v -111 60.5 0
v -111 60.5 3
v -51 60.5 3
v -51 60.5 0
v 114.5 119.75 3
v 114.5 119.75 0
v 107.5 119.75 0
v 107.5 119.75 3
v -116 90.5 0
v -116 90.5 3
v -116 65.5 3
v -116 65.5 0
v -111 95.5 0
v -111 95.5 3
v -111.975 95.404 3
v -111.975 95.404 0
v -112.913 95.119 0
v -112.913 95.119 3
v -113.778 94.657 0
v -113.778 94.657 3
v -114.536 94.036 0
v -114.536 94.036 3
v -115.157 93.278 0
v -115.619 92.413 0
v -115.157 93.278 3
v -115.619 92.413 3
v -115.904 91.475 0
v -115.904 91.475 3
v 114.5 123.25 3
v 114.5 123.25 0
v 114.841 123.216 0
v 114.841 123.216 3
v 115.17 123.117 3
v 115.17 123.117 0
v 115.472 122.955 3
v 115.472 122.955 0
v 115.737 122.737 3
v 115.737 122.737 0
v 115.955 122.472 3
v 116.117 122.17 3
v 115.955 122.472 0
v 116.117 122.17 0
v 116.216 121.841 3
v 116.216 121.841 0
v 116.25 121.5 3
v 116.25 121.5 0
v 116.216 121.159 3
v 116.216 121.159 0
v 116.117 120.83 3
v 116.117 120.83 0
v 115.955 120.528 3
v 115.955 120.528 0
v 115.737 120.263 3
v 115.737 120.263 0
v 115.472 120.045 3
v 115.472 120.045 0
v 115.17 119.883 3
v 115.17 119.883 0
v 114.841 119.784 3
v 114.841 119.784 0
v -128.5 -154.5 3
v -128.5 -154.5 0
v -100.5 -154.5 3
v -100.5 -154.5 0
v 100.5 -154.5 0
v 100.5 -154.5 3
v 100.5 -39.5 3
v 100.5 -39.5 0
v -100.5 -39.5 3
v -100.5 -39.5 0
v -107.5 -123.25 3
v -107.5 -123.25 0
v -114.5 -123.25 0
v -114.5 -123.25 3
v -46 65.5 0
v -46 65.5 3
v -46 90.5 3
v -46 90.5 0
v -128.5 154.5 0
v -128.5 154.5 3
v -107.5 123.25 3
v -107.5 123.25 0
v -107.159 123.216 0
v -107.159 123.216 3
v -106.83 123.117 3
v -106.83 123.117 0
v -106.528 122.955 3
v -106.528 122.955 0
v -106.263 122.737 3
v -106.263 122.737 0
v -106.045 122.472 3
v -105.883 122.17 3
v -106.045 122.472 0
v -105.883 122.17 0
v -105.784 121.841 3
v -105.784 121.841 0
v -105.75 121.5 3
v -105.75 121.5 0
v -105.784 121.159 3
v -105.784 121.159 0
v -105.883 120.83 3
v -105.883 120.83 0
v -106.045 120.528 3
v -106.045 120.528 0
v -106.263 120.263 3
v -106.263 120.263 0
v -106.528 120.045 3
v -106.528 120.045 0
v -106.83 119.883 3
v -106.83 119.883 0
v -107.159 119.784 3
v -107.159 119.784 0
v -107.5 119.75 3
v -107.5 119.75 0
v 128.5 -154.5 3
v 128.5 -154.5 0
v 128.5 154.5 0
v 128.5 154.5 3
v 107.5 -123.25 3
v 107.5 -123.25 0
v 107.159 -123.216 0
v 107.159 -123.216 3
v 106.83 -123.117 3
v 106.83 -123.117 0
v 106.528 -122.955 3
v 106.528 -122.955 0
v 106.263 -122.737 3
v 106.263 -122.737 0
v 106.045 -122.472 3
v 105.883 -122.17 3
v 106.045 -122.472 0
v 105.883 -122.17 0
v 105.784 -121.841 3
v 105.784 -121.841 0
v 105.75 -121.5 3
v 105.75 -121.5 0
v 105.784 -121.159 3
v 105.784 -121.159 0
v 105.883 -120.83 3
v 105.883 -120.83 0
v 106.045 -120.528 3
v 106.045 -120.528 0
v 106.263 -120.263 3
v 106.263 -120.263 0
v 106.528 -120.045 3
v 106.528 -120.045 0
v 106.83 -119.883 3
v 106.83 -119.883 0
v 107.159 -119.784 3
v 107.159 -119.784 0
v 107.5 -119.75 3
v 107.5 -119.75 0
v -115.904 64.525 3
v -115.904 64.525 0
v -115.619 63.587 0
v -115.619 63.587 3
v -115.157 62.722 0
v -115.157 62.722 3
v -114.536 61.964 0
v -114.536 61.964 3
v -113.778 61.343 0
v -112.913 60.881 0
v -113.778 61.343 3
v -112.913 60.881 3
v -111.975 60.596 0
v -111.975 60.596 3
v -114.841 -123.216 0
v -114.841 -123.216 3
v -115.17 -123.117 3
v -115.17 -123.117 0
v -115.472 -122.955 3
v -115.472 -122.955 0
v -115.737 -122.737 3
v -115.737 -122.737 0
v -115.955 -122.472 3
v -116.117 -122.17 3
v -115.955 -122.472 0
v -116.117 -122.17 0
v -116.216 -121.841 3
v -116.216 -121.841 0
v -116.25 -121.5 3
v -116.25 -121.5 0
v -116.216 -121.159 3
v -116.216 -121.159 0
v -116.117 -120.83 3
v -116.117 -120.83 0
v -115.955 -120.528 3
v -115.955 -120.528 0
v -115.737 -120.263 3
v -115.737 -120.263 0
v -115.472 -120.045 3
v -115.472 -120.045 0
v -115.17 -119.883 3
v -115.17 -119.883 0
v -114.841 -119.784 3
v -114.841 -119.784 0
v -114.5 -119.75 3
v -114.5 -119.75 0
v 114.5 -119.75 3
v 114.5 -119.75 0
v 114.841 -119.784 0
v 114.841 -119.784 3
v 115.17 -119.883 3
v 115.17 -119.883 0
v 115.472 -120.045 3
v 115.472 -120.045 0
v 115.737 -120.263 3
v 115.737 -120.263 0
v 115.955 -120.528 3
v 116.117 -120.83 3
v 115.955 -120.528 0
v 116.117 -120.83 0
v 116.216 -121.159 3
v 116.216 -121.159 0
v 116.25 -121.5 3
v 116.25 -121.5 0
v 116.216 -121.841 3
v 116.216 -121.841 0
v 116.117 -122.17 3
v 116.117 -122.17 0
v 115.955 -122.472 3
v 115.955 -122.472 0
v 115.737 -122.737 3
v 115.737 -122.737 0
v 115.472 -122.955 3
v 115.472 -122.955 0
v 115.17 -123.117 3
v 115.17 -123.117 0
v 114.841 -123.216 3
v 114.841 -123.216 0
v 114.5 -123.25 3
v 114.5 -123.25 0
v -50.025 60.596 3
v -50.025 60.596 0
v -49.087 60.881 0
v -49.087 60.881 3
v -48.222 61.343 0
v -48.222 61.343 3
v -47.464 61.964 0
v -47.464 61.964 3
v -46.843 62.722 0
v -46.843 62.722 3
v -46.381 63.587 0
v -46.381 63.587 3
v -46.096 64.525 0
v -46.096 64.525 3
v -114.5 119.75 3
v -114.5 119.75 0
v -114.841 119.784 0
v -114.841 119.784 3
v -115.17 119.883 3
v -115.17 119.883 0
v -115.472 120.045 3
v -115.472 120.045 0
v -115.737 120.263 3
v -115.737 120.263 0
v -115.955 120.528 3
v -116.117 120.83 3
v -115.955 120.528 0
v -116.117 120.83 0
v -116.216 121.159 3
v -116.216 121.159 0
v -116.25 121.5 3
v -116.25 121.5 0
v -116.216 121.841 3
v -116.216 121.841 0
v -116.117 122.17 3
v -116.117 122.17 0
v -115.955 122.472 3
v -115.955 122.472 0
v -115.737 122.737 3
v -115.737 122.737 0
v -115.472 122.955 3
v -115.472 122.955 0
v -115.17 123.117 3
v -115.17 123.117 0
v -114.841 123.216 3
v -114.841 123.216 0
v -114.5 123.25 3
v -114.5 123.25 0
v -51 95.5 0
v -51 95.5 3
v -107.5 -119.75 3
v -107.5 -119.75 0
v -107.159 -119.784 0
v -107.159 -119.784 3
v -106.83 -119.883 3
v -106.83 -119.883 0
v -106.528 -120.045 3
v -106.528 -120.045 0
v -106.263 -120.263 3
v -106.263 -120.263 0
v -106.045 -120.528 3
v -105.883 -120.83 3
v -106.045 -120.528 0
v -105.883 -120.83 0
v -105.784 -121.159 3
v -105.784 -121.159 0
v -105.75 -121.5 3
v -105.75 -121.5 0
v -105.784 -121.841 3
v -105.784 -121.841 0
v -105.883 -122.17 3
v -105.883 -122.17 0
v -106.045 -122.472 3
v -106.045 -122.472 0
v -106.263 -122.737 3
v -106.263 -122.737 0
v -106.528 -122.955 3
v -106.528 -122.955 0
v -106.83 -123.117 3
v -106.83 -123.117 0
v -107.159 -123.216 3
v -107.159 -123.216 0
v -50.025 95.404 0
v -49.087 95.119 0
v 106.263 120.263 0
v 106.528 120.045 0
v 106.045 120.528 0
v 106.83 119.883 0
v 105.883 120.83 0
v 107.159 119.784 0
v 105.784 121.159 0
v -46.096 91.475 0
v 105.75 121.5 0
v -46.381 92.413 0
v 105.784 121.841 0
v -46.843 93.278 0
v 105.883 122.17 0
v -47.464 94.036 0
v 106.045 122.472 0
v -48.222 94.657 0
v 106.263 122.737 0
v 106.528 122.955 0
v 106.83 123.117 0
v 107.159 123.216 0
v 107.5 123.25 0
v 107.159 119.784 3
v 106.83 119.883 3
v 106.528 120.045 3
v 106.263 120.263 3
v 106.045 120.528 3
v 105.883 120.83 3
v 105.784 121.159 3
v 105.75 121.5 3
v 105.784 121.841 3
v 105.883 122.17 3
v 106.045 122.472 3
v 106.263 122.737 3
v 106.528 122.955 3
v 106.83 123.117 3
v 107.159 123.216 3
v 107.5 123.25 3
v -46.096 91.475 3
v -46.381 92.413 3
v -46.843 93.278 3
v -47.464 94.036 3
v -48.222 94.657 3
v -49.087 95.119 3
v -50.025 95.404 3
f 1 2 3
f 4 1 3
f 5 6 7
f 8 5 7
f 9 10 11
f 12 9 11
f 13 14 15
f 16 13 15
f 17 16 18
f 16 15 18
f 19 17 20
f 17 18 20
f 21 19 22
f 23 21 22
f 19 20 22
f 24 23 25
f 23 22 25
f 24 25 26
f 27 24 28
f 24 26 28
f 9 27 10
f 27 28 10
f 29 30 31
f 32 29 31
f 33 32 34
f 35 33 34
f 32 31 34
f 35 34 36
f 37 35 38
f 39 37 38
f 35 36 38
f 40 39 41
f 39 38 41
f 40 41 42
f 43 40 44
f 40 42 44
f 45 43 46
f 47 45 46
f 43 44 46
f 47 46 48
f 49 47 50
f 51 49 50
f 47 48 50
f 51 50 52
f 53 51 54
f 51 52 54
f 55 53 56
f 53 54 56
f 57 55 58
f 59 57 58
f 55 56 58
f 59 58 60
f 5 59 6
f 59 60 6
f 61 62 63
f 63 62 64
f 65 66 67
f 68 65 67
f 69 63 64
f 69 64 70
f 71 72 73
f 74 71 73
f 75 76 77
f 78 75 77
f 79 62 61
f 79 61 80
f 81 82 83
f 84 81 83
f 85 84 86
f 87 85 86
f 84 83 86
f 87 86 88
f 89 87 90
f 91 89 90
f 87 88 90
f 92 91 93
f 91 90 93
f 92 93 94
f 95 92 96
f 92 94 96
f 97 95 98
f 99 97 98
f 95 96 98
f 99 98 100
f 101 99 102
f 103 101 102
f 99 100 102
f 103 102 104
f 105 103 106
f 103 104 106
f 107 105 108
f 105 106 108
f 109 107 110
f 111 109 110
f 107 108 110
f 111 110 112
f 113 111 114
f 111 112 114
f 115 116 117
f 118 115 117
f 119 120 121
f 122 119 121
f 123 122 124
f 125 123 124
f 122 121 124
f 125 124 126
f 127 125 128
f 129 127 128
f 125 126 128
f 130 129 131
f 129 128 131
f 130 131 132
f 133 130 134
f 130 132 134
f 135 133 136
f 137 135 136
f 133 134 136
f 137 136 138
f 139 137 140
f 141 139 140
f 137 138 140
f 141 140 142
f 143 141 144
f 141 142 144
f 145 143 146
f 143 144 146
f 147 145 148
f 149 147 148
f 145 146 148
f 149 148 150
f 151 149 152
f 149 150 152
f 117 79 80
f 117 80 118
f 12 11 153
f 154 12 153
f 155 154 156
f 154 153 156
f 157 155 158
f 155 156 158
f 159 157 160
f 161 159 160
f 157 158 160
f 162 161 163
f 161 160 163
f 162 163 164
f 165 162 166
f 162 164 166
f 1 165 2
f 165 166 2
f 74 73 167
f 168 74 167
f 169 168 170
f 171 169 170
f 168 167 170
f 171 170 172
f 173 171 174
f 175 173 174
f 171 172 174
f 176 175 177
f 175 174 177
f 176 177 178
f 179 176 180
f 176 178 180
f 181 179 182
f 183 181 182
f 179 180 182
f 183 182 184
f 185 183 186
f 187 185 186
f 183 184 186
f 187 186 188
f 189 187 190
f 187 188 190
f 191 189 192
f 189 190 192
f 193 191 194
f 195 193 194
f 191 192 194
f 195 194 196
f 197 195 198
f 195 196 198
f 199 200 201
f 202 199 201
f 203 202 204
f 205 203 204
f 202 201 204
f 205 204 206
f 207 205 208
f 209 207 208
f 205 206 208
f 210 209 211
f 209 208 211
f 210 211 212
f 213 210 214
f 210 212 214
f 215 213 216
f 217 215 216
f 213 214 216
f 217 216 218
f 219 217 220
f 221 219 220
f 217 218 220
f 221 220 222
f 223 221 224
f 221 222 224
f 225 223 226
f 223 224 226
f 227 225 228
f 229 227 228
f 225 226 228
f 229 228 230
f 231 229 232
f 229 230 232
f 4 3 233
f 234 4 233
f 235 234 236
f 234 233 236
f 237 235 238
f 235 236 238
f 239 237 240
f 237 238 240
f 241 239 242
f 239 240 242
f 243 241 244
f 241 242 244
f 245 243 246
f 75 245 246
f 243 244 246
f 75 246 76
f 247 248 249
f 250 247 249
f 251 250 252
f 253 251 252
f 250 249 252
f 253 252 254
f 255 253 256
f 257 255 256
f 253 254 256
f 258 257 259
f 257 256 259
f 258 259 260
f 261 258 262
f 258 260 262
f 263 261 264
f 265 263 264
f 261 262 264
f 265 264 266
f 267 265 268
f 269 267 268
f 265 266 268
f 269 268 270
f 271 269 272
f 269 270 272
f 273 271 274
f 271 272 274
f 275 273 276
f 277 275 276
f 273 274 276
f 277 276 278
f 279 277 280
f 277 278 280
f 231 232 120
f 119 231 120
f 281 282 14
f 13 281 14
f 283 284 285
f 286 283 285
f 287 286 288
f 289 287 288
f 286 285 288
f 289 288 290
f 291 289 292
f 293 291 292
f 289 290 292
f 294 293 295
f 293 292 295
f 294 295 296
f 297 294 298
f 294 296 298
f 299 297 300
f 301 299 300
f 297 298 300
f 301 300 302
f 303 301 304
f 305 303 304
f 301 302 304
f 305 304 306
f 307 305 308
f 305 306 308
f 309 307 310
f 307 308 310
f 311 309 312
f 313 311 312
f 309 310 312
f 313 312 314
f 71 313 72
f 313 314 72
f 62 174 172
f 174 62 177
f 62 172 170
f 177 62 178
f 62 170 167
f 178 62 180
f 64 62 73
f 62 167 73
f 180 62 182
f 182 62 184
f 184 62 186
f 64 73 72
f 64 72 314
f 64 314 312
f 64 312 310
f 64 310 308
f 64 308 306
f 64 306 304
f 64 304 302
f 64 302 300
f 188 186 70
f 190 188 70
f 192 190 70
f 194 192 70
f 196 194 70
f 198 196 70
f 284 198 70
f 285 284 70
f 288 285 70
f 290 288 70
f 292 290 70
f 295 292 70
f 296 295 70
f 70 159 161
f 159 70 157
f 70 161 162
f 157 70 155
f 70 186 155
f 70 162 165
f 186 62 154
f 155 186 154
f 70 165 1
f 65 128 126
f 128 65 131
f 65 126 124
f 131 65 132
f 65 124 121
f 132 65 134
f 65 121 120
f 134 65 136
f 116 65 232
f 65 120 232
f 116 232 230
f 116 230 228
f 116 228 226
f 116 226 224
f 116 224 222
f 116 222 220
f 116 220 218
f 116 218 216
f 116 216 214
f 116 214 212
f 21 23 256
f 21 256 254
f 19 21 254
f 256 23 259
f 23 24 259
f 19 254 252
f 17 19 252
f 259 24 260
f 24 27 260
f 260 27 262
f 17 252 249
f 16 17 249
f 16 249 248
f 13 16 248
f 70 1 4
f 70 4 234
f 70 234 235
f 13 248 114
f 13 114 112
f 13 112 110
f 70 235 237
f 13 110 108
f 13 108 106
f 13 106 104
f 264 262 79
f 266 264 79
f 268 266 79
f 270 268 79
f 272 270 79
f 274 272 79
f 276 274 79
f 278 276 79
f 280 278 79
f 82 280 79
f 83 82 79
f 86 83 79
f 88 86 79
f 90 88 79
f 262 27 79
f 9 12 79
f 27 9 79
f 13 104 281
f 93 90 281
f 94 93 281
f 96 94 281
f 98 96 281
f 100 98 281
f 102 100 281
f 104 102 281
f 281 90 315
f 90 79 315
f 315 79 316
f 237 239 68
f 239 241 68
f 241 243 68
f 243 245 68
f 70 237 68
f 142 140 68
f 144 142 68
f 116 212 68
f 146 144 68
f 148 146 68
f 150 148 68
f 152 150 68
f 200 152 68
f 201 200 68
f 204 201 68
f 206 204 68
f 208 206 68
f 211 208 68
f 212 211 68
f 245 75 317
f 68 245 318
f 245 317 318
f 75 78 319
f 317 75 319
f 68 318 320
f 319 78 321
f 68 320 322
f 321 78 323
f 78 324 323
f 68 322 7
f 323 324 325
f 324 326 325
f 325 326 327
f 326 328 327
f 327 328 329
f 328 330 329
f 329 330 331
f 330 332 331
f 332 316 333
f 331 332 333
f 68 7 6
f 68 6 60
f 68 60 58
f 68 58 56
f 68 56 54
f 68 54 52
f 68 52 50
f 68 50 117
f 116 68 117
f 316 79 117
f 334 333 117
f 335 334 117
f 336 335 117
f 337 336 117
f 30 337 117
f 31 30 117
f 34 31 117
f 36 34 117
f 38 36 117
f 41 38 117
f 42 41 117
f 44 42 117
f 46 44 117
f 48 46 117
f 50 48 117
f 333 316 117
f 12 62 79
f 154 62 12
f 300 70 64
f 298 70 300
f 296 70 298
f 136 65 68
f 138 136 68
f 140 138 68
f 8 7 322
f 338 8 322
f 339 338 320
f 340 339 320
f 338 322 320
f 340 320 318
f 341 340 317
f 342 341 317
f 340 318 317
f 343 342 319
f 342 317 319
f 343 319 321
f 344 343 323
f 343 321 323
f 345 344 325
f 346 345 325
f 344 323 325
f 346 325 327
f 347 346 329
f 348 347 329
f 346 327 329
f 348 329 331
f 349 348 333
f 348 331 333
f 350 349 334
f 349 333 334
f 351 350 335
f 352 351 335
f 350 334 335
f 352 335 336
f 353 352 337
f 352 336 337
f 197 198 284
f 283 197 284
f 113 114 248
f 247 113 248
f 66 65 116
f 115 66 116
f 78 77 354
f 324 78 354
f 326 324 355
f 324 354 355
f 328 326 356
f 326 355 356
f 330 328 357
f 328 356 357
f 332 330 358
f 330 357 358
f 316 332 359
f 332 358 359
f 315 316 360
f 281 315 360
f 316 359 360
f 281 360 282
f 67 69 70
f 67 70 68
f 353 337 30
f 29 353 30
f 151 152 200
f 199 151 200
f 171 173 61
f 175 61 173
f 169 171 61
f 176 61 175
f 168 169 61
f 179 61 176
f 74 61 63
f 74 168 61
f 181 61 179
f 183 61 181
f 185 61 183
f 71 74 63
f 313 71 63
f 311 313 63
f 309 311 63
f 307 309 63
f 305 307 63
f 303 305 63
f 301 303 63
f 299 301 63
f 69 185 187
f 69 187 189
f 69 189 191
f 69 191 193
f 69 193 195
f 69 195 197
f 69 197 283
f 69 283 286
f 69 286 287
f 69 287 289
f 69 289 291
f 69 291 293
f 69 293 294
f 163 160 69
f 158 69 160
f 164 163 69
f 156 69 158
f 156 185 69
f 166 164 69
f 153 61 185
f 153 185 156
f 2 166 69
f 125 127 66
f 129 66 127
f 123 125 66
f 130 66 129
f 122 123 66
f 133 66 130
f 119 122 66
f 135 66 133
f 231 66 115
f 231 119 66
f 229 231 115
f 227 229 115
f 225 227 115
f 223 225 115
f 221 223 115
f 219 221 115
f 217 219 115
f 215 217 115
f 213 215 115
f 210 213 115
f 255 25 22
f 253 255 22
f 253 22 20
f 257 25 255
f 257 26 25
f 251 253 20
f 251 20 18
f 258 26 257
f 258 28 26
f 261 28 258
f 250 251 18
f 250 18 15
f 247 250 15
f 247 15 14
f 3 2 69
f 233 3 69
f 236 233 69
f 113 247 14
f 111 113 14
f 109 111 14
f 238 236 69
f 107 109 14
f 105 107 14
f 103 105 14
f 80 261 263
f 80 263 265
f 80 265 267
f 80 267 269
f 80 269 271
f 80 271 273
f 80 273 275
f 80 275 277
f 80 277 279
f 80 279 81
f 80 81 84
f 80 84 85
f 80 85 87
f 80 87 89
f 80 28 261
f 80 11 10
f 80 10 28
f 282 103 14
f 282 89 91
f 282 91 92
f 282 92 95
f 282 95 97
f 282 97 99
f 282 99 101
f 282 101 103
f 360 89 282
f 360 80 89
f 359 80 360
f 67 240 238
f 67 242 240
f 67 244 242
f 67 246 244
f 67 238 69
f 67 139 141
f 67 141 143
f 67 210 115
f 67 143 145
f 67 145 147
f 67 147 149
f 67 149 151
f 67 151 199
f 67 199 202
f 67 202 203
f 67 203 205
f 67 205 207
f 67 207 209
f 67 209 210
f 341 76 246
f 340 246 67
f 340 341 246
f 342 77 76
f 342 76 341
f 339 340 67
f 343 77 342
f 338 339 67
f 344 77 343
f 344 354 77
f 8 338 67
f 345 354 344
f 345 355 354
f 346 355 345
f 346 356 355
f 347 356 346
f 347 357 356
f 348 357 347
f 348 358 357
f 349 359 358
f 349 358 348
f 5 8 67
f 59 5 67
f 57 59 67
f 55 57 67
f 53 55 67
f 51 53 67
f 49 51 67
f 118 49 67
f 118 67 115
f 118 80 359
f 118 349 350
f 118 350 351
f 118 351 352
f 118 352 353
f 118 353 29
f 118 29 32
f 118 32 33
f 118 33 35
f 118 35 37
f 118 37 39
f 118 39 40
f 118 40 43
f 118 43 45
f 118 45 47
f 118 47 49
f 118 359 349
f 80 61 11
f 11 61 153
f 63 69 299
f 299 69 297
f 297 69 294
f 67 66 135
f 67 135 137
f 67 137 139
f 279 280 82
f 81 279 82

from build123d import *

# Parameters (mm, degrees)
ESQUISSE1_W             = 257
ESQUISSE1_H             = 309
BOSS_EXTRU_1_DEPTH      = 3
ESQUISSE2_W             = 201
ESQUISSE2_H             = 115
ENL_V_MAT_EXTRU_1_DEPTH = 4
ENL_V_MAT_EXTRU_2_DEPTH = 4


with BuildPart() as part:
    # Esquisse1 → Boss.-Extru.1 (new body)
    with BuildSketch(Plane.XY):
        Rectangle(ESQUISSE1_W, ESQUISSE1_H)
        with BuildLine():
            Line((-114.5, 123.25), (-107.5, 123.25))
            ThreePointArc((-107.5, 123.25), (-105.75, 121.5), (-107.5, 119.75))
            Line((-107.5, 119.75), (-114.5, 119.75))
            ThreePointArc((-114.5, 119.75), (-116.25, 121.5), (-114.5, 123.25))
        make_face(mode=Mode.SUBTRACT)
        with BuildLine():
            Line((107.5, -119.75), (114.5, -119.75))
            ThreePointArc((114.5, -119.75), (116.25, -121.5), (114.5, -123.25))
            Line((114.5, -123.25), (107.5, -123.25))
            ThreePointArc((107.5, -123.25), (105.75, -121.5), (107.5, -119.75))
        make_face(mode=Mode.SUBTRACT)
        with BuildLine():
            Line((-114.5, -119.75), (-107.5, -119.75))
            ThreePointArc((-107.5, -119.75), (-105.75, -121.5), (-107.5, -123.25))
            Line((-107.5, -123.25), (-114.5, -123.25))
            ThreePointArc((-114.5, -123.25), (-116.25, -121.5), (-114.5, -119.75))
        make_face(mode=Mode.SUBTRACT)
        with BuildLine():
            Line((107.5, 123.25), (114.5, 123.25))
            ThreePointArc((114.5, 123.25), (116.25, 121.5), (114.5, 119.75))
            Line((114.5, 119.75), (107.5, 119.75))
            ThreePointArc((107.5, 119.75), (105.75, 121.5), (107.5, 123.25))
        make_face(mode=Mode.SUBTRACT)
    extrude(amount=BOSS_EXTRU_1_DEPTH)

    # Esquisse2 → Enlèv. mat.-Extru.1 (cut, through all)
    with BuildSketch(Plane.XY.offset(3)):
        with Locations((0, -97)):
            Rectangle(ESQUISSE2_W, ESQUISSE2_H)
    extrude(amount=-ENL_V_MAT_EXTRU_1_DEPTH, mode=Mode.SUBTRACT)

    # Esquisse3 → Enlèv. mat.-Extru.2 (cut, through all)
    with BuildSketch(Plane.XY.offset(3)):
        with BuildLine():
            Line((-111, 60.5), (-51, 60.5))
            ThreePointArc((-51, 60.5), (-47.464466094, 61.964466094), (-46, 65.5))
            Line((-46, 65.5), (-46, 90.5))
            ThreePointArc((-46, 90.5), (-47.464466094, 94.035533906), (-51, 95.5))
            Line((-51, 95.5), (-111, 95.5))
            ThreePointArc((-111, 95.5), (-114.535533906, 94.035533906), (-116, 90.5))
            Line((-116, 90.5), (-116, 65.5))
            ThreePointArc((-116, 65.5), (-114.535533906, 61.964466094), (-111, 60.5))
        make_face()
    extrude(amount=-ENL_V_MAT_EXTRU_2_DEPTH, mode=Mode.SUBTRACT)


solid = part.part
